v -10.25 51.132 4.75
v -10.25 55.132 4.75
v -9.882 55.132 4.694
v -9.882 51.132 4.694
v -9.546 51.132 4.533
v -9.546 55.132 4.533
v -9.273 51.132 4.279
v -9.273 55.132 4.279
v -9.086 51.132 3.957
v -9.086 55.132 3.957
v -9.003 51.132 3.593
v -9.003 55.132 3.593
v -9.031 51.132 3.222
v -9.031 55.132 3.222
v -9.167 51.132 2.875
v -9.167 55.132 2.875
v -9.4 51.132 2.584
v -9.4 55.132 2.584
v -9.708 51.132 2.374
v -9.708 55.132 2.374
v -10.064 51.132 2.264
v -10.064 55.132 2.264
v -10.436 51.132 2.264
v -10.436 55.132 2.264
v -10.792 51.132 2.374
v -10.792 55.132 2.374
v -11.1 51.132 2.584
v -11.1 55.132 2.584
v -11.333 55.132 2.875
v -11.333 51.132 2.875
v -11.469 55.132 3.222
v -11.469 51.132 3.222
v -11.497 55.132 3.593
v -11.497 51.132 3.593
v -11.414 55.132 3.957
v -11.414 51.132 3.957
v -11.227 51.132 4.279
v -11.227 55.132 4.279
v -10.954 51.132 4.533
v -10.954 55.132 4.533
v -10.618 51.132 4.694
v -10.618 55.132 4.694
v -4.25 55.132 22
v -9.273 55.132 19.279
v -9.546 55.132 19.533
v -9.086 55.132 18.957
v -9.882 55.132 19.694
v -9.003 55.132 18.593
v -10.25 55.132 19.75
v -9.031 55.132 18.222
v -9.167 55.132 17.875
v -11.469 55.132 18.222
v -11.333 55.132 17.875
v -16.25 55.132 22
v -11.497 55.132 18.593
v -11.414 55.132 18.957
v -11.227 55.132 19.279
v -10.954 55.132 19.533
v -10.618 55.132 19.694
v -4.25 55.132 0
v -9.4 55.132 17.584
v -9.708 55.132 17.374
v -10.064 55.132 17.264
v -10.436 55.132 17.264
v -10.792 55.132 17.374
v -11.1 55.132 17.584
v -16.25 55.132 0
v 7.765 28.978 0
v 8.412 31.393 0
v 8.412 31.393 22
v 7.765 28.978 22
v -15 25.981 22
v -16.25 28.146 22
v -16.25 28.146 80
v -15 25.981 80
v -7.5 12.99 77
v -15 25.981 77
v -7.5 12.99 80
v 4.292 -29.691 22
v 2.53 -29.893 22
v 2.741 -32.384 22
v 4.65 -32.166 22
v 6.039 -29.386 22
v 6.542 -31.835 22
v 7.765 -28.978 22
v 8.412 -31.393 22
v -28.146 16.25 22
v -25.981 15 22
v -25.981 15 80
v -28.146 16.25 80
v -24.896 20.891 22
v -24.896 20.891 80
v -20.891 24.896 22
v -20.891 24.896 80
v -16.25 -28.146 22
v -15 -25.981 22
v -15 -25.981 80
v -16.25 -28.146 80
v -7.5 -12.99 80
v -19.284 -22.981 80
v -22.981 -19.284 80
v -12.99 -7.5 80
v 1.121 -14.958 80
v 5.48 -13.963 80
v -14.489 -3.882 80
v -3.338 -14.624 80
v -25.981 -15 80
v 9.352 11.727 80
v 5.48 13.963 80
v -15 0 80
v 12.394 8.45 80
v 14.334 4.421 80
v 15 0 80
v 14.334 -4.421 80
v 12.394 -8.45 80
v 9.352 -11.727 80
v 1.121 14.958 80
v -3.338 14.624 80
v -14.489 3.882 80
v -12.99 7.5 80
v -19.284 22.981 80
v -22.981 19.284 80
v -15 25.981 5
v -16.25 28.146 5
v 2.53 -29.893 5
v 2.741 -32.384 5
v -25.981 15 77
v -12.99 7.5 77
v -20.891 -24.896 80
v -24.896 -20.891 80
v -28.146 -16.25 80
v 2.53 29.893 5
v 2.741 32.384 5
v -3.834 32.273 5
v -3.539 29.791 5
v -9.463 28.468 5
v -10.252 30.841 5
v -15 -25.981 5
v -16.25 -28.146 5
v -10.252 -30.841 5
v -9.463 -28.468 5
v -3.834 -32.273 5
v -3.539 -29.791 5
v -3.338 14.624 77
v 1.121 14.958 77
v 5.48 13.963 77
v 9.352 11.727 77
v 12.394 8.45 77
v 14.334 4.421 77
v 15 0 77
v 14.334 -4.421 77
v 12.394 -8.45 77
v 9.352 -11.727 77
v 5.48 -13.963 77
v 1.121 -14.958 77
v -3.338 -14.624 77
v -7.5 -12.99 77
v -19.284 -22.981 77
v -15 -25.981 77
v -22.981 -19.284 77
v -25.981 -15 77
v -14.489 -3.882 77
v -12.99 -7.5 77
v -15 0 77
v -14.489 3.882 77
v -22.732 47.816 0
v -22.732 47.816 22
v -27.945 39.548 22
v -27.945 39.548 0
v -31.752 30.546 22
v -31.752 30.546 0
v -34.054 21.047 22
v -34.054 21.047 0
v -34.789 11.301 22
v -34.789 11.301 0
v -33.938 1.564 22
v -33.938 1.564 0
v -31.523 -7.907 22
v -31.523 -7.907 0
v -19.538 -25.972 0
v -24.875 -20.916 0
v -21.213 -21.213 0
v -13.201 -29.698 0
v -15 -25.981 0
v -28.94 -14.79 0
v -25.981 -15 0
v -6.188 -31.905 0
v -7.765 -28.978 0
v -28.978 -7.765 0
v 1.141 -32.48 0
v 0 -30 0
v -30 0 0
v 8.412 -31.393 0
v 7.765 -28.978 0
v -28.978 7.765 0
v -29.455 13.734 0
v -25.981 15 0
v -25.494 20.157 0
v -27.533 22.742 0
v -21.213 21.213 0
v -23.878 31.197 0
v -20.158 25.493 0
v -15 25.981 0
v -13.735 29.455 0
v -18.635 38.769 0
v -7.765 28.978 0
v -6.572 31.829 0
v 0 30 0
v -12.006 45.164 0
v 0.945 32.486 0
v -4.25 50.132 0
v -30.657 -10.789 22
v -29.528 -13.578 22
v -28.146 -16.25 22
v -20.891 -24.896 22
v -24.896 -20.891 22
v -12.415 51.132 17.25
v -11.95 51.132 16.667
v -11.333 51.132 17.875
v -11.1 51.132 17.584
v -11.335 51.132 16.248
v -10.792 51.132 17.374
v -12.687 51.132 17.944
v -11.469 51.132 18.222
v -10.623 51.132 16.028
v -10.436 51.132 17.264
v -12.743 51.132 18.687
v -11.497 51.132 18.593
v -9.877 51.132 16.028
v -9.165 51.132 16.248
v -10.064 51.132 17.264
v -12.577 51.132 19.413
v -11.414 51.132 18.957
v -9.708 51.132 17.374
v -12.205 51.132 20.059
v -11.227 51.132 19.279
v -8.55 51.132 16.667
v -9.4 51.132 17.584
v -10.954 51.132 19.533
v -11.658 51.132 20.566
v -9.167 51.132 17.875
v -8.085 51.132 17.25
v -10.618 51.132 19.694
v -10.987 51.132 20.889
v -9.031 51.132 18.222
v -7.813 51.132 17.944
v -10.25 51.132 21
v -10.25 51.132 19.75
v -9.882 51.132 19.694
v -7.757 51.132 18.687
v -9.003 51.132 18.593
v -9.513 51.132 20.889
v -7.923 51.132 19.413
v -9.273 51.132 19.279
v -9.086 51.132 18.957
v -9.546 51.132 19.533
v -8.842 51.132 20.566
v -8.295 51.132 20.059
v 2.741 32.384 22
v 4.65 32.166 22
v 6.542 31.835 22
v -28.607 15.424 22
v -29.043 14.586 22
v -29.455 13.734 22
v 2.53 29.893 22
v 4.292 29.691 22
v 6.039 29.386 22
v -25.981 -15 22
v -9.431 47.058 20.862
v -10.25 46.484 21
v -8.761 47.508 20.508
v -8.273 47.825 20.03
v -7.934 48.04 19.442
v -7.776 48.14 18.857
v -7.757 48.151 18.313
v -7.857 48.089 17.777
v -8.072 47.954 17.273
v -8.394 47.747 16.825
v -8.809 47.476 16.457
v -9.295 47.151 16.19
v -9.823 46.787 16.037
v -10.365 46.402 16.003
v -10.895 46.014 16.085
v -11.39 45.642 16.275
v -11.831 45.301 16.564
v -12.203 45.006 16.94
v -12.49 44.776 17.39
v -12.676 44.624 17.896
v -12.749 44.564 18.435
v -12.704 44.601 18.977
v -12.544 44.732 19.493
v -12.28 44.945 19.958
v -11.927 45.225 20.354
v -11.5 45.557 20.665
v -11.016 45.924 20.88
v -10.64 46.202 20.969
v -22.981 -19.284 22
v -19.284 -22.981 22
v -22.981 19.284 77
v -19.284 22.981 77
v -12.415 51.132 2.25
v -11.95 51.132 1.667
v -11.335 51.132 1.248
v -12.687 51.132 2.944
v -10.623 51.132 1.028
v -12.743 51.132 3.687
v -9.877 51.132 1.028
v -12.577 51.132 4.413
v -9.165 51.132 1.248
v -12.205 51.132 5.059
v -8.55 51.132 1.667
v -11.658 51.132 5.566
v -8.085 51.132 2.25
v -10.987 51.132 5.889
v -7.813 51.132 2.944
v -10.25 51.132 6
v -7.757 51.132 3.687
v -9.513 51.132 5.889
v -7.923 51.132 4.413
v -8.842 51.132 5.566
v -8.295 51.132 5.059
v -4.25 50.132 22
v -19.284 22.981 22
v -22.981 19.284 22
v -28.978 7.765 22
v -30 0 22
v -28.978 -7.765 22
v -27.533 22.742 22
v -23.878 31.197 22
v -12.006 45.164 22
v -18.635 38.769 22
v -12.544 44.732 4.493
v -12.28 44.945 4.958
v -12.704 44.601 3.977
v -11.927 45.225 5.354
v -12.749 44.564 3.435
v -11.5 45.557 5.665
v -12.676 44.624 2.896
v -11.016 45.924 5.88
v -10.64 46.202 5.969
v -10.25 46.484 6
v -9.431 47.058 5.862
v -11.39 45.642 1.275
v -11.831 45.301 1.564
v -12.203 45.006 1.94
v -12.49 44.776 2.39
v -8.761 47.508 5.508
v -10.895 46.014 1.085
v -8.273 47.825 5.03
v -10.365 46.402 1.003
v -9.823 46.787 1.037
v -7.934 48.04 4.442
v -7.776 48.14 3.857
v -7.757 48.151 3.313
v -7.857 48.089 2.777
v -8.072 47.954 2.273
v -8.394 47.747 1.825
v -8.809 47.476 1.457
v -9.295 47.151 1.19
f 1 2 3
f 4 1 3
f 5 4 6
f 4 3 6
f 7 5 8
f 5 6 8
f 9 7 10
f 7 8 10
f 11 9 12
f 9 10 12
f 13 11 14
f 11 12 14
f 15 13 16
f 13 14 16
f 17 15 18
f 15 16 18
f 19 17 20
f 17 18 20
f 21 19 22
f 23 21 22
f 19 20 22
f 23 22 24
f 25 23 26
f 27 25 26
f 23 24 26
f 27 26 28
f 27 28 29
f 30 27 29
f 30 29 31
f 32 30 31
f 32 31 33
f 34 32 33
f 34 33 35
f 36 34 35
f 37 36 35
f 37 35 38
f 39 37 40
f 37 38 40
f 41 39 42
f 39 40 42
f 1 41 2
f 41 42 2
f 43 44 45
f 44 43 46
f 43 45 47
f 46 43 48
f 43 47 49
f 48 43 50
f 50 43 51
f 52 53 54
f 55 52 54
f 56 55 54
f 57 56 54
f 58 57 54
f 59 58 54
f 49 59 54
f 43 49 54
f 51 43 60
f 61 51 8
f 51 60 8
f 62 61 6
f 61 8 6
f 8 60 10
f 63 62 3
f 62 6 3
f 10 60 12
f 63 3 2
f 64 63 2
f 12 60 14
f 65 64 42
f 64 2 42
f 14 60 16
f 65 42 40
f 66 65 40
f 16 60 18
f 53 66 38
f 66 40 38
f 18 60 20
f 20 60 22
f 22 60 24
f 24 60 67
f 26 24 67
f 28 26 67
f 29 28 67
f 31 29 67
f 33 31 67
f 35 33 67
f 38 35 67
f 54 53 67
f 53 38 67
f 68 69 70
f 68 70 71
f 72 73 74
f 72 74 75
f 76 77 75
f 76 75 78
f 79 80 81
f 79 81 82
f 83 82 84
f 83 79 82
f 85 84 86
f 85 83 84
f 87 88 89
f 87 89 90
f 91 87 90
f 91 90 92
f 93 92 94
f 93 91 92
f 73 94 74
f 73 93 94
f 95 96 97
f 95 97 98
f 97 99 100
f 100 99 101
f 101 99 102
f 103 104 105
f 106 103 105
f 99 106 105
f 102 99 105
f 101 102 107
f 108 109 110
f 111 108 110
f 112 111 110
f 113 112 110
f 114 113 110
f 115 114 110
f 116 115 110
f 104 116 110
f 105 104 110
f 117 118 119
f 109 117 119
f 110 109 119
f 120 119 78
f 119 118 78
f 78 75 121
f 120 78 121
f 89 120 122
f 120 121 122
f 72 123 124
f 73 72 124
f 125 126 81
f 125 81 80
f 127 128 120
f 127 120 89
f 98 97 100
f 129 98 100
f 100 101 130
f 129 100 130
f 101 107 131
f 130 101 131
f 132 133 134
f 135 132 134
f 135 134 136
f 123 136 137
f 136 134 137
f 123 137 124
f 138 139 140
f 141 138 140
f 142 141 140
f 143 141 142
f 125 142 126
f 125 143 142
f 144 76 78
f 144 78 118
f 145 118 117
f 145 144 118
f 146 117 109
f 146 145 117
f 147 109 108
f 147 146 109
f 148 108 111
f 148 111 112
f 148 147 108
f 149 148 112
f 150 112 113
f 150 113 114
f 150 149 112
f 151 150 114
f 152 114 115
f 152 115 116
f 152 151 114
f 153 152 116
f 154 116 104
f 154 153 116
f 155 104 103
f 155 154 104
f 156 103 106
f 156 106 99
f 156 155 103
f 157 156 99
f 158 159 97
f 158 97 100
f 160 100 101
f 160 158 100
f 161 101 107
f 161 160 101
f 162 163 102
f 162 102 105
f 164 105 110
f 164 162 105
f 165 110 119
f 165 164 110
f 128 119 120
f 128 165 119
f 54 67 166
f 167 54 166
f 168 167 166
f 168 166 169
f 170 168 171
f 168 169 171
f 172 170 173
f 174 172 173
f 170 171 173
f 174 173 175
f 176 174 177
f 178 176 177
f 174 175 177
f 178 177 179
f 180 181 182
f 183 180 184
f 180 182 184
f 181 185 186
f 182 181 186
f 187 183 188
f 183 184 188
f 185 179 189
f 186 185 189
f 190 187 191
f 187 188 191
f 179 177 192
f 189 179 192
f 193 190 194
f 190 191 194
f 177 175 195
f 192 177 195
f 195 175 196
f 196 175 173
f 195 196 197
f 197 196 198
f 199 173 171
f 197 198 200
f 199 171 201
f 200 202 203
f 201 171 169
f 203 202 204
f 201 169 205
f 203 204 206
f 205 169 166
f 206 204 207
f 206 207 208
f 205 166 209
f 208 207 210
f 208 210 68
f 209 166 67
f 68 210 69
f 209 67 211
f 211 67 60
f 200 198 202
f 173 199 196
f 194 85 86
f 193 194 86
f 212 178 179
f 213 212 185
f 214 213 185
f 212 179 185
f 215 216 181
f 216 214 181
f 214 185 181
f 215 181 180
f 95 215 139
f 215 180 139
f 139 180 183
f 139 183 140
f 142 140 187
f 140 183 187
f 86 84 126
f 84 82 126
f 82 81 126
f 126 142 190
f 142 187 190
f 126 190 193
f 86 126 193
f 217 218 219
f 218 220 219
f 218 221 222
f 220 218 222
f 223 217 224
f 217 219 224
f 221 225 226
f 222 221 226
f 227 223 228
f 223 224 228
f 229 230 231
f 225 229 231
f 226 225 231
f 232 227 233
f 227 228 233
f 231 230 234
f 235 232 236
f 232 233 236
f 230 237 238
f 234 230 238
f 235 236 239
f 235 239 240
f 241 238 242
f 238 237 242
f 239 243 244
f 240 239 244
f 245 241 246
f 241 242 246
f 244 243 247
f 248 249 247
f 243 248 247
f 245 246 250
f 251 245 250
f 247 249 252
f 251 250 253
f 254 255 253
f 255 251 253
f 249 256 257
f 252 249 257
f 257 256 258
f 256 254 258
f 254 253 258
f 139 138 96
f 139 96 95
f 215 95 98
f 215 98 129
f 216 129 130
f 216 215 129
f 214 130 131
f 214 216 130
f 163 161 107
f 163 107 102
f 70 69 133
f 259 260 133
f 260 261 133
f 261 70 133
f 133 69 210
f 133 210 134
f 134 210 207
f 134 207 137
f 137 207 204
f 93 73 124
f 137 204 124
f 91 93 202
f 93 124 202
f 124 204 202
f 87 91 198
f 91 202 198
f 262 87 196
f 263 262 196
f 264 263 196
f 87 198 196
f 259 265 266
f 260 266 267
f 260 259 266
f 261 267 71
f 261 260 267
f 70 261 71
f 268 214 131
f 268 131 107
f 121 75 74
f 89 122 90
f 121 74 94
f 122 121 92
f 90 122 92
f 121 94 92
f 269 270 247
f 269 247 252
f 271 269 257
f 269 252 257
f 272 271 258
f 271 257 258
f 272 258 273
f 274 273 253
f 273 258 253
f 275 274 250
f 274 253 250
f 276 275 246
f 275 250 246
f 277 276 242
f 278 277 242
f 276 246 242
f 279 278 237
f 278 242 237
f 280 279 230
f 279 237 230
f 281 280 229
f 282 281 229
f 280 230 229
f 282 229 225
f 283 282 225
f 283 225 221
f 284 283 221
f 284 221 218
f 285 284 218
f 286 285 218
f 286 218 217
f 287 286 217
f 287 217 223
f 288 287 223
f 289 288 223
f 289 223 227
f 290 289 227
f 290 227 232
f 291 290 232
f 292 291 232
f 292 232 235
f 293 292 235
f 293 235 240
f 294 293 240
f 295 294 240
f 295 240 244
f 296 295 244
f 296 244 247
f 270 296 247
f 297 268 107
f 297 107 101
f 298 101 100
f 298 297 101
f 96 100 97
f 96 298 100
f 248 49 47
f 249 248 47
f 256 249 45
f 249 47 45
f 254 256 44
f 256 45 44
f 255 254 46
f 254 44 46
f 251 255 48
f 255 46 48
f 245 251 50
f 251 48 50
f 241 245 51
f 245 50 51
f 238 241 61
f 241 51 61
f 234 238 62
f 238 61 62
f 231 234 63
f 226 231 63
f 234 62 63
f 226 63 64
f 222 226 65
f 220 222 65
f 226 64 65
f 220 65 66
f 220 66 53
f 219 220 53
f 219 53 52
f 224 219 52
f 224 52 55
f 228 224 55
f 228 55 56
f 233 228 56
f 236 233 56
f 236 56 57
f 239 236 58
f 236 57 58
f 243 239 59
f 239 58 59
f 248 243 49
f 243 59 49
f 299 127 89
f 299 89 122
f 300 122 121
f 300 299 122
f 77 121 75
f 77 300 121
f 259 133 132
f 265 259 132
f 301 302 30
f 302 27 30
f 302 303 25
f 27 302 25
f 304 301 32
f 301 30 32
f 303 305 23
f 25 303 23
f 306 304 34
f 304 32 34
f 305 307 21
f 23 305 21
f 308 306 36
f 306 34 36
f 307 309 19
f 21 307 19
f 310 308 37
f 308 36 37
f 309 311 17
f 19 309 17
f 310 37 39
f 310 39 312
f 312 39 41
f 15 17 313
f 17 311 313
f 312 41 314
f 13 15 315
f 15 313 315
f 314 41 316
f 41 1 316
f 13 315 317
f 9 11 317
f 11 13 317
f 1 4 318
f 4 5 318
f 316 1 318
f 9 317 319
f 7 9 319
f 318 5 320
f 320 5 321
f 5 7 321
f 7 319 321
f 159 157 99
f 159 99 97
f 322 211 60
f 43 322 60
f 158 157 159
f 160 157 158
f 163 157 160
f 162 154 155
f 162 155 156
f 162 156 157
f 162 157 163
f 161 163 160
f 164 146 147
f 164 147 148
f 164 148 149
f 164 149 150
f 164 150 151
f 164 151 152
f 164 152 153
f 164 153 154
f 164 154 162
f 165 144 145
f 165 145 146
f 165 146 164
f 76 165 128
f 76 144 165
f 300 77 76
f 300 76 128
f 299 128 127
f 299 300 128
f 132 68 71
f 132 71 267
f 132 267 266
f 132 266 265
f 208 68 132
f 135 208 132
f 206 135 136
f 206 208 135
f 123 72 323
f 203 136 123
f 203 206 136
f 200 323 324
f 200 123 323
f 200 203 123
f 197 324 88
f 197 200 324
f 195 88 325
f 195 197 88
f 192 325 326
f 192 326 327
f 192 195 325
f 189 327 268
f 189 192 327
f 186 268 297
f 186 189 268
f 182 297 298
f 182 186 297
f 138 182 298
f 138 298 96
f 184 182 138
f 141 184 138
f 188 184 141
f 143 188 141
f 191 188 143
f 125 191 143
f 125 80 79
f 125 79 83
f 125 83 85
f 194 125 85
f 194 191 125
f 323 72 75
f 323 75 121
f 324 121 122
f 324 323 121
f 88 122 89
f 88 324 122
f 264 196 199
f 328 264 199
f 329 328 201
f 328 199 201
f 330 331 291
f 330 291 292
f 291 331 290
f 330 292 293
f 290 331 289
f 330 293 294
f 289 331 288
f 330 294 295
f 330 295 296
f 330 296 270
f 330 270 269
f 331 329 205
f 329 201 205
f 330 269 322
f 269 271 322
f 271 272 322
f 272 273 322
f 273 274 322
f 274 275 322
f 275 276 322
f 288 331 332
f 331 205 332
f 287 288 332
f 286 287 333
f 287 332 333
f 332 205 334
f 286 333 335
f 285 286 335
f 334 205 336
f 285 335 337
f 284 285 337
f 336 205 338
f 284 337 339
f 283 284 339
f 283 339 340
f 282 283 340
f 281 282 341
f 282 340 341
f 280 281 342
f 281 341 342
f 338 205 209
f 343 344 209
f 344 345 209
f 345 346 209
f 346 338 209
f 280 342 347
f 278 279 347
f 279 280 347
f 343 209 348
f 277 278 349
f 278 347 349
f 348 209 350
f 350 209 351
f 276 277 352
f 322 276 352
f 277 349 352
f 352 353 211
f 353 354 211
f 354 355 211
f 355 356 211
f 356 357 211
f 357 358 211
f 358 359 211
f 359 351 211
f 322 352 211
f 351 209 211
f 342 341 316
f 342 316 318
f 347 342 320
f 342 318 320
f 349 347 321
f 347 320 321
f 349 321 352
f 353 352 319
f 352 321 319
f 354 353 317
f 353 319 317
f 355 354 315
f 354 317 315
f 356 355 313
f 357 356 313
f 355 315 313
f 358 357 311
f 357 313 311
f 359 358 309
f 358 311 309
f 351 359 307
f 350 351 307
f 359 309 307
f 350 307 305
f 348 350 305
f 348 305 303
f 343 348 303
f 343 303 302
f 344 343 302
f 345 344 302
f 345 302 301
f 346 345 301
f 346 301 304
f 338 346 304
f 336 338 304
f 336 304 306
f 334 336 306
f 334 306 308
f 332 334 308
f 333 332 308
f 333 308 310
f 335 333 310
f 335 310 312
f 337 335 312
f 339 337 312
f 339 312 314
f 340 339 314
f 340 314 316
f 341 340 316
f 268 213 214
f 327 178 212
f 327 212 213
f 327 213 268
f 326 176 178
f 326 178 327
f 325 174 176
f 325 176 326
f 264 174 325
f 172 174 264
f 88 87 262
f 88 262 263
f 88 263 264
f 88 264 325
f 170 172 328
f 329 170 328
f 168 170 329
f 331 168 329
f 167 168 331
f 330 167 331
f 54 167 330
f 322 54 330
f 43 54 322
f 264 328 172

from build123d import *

# Parameters (mm, degrees)
ESQUISSE1_R                  = 32.5
ESQUISSE1_R_2                = 30
BOSS_EXTRU_1_DEPTH           = 22
BOSS_EXTRU_2_DEPTH           = 58
BOSS_EXTRU_3_START           = -77
BOSS_EXTRU_3_DEPTH           = 3
BOSS_EXTRU_4_DEPTH           = 22
ENL_V_MAT_EXTRU_1_DEPTH      = 22
ENL_V_START                  = -5
ENL_V_MAT_EXTRU_3_DEPTH      = 52
ESQUISSE9_R                  = 1.25
ENL_V_MAT_EXTRU_4_DEPTH      = 4
ENL_V_MAT_EXTRU_5_REACH      = 122.85
ENL_V_MAT_EXTRU_5_END_RADIUS = 46.665875386
ESQUISSE10_R                 = 2.5


with BuildPart() as part:
    # Esquisse1 → Boss.-Extru.1 (new body)
    with BuildSketch(Plane.XY):
        Circle(ESQUISSE1_R)
        Circle(ESQUISSE1_R_2, mode=Mode.SUBTRACT)
    extrude(amount=BOSS_EXTRU_1_DEPTH)

    # Esquisse2 → Boss.-Extru.2 (add)
    with BuildSketch(Plane.XY.offset(22)):
        with BuildLine():
            Line((-16.25, 28.145825623), (-15, 25.980762114))
            ThreePointArc((-15, 25.980762114), (-21.213203436, 21.213203436), (-25.980762114, 15))
            Line((-25.980762114, 15), (-28.145825623, 16.25))
            ThreePointArc((-28.145825623, 16.25), (-22.980970389, 22.980970389), (-16.25, 28.145825623))
        make_face()
        with BuildLine():
            Line((-28.145825623, -16.25), (-25.980762114, -15))
            ThreePointArc((-25.980762114, -15), (-21.213203436, -21.213203436), (-15, -25.980762114))
            Line((-15, -25.980762114), (-16.25, -28.145825623))
            ThreePointArc((-16.25, -28.145825623), (-22.980970389, -22.980970389), (-28.145825623, -16.25))
        make_face()
    extrude(amount=BOSS_EXTRU_2_DEPTH)

    # Esquisse5 → Boss.-Extru.4 (add)
    with BuildSketch(Plane(origin=(0, 0, 0), x_dir=(-1, 0, 0), z_dir=(0, 0, -1))):
        with BuildLine():
            Line((4.25, 50.131720502), (4.25, 55.131720502))
            Line((4.25, 55.131720502), (16.25, 55.131720502))
            ThreePointArc((16.25, 55.131720502), (33.096232565, 25.843443716), (31.523352961, -7.907478619))
            ThreePointArc((31.523352961, -7.907478619), (32.352628695, 3.091507158), (29.455329215, 13.734394083))
            ThreePointArc((29.455329215, 13.734394083), (21.443712719, 35.112380899), (4.25, 50.131720502))
        make_face()
    extrude(amount=-BOSS_EXTRU_4_DEPTH)

    # Esquisse6 → Enlèv. mat.-Extru.1 (cut)
    with BuildSketch(Plane(origin=(0, 0, 0), x_dir=(-1, 0, 0), z_dir=(0, 0, -1))):
        Polygon((0, 0), (-10.262824663, -38.301383073), (-52.320818682, 0), (-10.262824663, 38.301383073), align=None)
    extrude(amount=-ENL_V_MAT_EXTRU_1_DEPTH, mode=Mode.SUBTRACT)

    # Esquisse8 → Enlèv. mat.-Extru.3 (cut)
    with BuildSketch(Plane(origin=(0, 0, 0), x_dir=(-1, 0, 0), z_dir=(0, 0, -1)).offset(ENL_V_START)):
        with BuildLine():
            Line((-2.740791097, 32.384225545), (-1.521870682, 17.981889782))
            Line((-1.521870682, 17.981889782), (8.380077244, 14.514719558))
            Line((8.380077244, 14.514719558), (16.25, 28.145825623))
            ThreePointArc((16.25, 28.145825623), (7.079243588, 31.719620272), (-2.740791097, 32.384225545))
        make_face()
        with BuildLine():
            Line((-2.740791097, -32.384225545), (-1.521870682, -17.981889782))
            Line((-1.521870682, -17.981889782), (8.380077244, -14.514719558))
            Line((8.380077244, -14.514719558), (16.25, -28.145825623))
            ThreePointArc((16.25, -28.145825623), (7.079243588, -31.719620272), (-2.740791097, -32.384225545))
        make_face()
    extrude(amount=-ENL_V_MAT_EXTRU_3_DEPTH, mode=Mode.SUBTRACT)

    # Esquisse9 → Enlèv. mat.-Extru.4 (cut)
    with BuildSketch(Plane(origin=(0, 55.131720502, 0), x_dir=(1, 0, 0), z_dir=(0, 1, 0))):
        with Locations(Location((-10.25, -3.5, 0), (0, 0, 270))):
            Circle(ESQUISSE9_R)
        with Locations(Location((-10.25, -18.5, 0), (0, 0, 270))):
            Circle(ESQUISSE9_R)
    extrude(amount=-ENL_V_MAT_EXTRU_4_DEPTH, mode=Mode.SUBTRACT)

    # Enlèv. mat.-Extru.5: up to this cylinder (the profile starts outside it)
    enl_v_mat_extru_5_end = Plane(origin=(16.921063344, 8.544583039, 11), z_dir=(0, 0, -1)) * Cylinder(ENL_V_MAT_EXTRU_5_END_RADIUS, 355.031750771, mode=Mode.PRIVATE)
    # Esquisse10 → Enlèv. mat.-Extru.5 (cut, up to the surface)
    with BuildSketch(Plane(origin=(0, 51.131720502, 0), x_dir=(1, 0, 0), z_dir=(0, 1, 0)), mode=Mode.PRIVATE) as enl_v_mat_extru_5_sk1:
        with Locations(Location((-10.25, -3.5, 0), (0, 0, 270))):
            Circle(ESQUISSE10_R)
    enl_v_mat_extru_5_tool1 = extrude(enl_v_mat_extru_5_sk1.sketch, amount=-ENL_V_MAT_EXTRU_5_REACH, mode=Mode.PRIVATE) - enl_v_mat_extru_5_end
    add(enl_v_mat_extru_5_tool1.solids().sort_by_distance((-10.25, 51.131721, 3.5))[0], mode=Mode.SUBTRACT)
    # Esquisse10 → Enlèv. mat.-Extru.5 (cut, up to the surface)
    with BuildSketch(Plane(origin=(0, 51.131720502, 0), x_dir=(1, 0, 0), z_dir=(0, 1, 0)), mode=Mode.PRIVATE) as enl_v_mat_extru_5_sk2:
        with Locations(Location((-10.25, -18.5, 0), (0, 0, 270))):
            Circle(ESQUISSE10_R)
    enl_v_mat_extru_5_tool2 = extrude(enl_v_mat_extru_5_sk2.sketch, amount=-ENL_V_MAT_EXTRU_5_REACH, mode=Mode.PRIVATE) - enl_v_mat_extru_5_end
    add(enl_v_mat_extru_5_tool2.solids().sort_by_distance((-10.25, 51.131721, 18.5))[0], mode=Mode.SUBTRACT)


with BuildPart() as body_2:
    # Esquisse3 → Boss.-Extru.3 (new body)
    with BuildSketch(Plane(origin=(0, 0, 0), x_dir=(-1, 0, 0), z_dir=(0, 0, -1)).offset(BOSS_EXTRU_3_START)):
        with BuildLine():
            ThreePointArc((12.990381057, -7.5), (15, 0), (12.990381057, 7.5))
            Line((12.990381057, 7.5), (25.980762114, 15))
            ThreePointArc((25.980762114, 15), (21.213203436, 21.213203436), (15, 25.980762114))
            Line((15, 25.980762114), (7.5, 12.990381057))
            ThreePointArc((7.5, 12.990381057), (-15, 0), (7.5, -12.990381057))
            Line((7.5, -12.990381057), (15, -25.980762114))
            ThreePointArc((15, -25.980762114), (21.213203436, -21.213203436), (25.980762114, -15))
            Line((25.980762114, -15), (12.990381057, -7.5))
        make_face()
    extrude(amount=-BOSS_EXTRU_3_DEPTH)


solid = Compound([part.part, body_2.part])
